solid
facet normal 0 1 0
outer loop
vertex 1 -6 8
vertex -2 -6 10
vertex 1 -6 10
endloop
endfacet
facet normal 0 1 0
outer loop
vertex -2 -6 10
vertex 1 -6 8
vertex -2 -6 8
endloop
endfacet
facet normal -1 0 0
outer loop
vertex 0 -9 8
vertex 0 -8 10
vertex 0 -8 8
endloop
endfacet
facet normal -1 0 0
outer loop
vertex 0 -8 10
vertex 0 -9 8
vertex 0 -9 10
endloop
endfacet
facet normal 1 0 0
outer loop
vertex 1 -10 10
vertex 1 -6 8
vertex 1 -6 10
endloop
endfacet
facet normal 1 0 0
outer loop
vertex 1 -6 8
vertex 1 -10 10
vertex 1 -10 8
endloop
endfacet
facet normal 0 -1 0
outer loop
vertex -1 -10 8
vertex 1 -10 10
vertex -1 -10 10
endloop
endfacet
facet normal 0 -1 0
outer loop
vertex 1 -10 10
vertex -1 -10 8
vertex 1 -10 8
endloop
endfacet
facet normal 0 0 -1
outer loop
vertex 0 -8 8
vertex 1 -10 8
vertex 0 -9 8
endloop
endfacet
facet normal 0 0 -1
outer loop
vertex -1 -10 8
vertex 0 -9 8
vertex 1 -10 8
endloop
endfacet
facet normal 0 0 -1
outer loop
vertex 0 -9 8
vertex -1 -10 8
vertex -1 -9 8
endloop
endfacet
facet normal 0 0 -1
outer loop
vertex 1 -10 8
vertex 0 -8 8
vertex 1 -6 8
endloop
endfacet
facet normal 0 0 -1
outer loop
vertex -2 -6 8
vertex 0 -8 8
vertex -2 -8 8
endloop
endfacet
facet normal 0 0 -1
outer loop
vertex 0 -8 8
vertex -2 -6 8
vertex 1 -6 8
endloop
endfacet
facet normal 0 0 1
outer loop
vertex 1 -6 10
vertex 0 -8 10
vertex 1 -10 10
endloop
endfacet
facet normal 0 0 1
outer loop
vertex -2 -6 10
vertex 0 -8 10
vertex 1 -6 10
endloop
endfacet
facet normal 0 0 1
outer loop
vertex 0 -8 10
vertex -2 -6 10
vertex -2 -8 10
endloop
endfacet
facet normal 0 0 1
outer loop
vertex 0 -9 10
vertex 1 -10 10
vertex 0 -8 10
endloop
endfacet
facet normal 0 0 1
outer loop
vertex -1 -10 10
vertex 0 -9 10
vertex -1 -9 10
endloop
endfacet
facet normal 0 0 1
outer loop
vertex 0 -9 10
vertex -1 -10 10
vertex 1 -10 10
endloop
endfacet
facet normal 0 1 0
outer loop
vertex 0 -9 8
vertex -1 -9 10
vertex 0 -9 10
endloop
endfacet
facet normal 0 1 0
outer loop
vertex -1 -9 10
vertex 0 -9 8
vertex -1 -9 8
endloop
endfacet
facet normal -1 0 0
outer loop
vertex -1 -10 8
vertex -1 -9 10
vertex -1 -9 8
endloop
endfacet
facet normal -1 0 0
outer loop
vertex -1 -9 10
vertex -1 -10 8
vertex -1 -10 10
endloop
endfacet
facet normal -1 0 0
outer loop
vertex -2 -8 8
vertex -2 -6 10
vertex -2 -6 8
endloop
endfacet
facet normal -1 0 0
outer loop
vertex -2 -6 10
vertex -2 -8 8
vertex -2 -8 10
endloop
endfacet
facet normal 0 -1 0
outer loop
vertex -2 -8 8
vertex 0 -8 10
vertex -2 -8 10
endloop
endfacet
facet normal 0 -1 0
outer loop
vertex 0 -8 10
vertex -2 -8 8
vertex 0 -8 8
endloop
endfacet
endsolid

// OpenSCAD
// file: myCylinder.scad
// Copyright Stephen Morrisson 2017
// All rights reserved

// rh Cent Cylinder
// rh Cylinder


module rhCentCylinder(c, rRadius, z)
{
    color(c) cylinder(h=z, r=rRadius, center=true);
}
rhCentCylinder("red", 3, 2);

module rhHalfCylinder(c, rRadius, z)
{
    negR = -1.0 * rRadius;
    rD = rRadius * 2.0;
    difference()
    {
	rhCentCylinder(c, rRadius, z);
//        transCylinder(c, negR, 0, 0, rRadius, z);
        //translate([-rD, 0, -z]) cube(rD, rD, z * 3.0);  
    }
}
rhHalfCylinder("red", 5, 3); 
// file: myCube.scad
// Copyright Stephen Morrisson 2017
// All rights reserved

// {xyz, rot, trans, tr} Cube

module xyzCube(c, x, y, z)
{
    color(c) cube([x, y, z], false);
}

module rotCube(c, rotX, rotY, rotZ, x, y, z)
{
    rotate([rotX, rotY, rotZ]) xyzCube(c, x, y, z);
}
translate([-15, 15, 0,])rotCube("green", 45, 45, 45, 2,2,2);

module transCube(c, xOffset, yOffset, zOffset, x, y, z)
{
    translate([xOffset, yOffset, zOffset]) xyzCube(c, x, y, z);
}
transCube("brown", -15, -15, 0, 3, 2, 1);


module trCube(c, rotX, rotY, rotZ, xO, yO, zO, x, y, z)
{
    translate([xO, yO, zO])
    rotate([rotX, rotY, rotZ])
    xyzCube(c, x, y, z);
}
//trCube("yellow", 0,0,0, 0,0,0, 2, 3, 4);
//trCube("green", 45, 45, 45, 4, 3, 1, 5, 6, 7);
//trCube("blue", 0, 0, 45, 20, 0, 0, 5, 6, 7);
trCube("orange", 0,0,0, -10, 0, 0, 1,1,1);
//trCube("orange", 45,0,0, -15, 0, 0, 1,1,1);
//trCube("orange", 0,45,0, -20, 0, 0, 1,1,1);
//trCube("orange", 0,0,45, -25, 0, 0, 1,1,1);
// main file
// Copyright Stephen Morrisson 2017
// All rights reserved

// {xyz, trans, rot} UBar


use <myCube.scad>
use <myCylinder.scad>



module xyzUBar(cB, cL, cR, xBase, yBase, zBase, 
    xLeft, zLeft, xRight, zRight)
{
    xyzCube(cB, xBase, yBase, zBase);
    transCube(cL, 0, 0, zBase, xLeft, yBase, zLeft);
    transCube(cR, xBase - xRight, 0, zBase, xRight, yBase, zRight);
}

//xyzUBar("red", "green", "blue", 10, 14, 1, 2, 3, 4, 5);

module transUBar(c, xO, yO, zO, xB, yB, zB, xL, zL, xR, zR)
{
    translate([xO, yO, zO]) xyzUBar(c, c, c, xB, yB, zB, xL, zL, xR, zR);
}
//transUBar("orange", -10, -10, -1,  4, 2, 1, 1, 1, 2, 2);


module rotUBar(c, rotX, rotY, rotZ, xO, yO, zO,
    xB, yB, zB, xL, zL, xR, zR)
{
    rotate([rotX, rotY, rotZ]) transUBar(c, xO, yO, zO, xB, yB, zB,
        xL, zL, xR, zR);
}
rotUBar("orange", 90, 180, 270, -10, -10, -1,  4, 2, 1, 1, 1, 2, 2);
